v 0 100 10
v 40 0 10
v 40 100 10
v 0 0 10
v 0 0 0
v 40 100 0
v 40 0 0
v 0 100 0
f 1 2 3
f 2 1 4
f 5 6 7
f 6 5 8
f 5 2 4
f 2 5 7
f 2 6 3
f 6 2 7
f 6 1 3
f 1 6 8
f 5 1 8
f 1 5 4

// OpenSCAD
translate([0.0,0.0,0.0])scale([1.0,1.0,1.0])rotate([0.0,0.0,0.0])  cube([40.0,100.0,10.0]);
